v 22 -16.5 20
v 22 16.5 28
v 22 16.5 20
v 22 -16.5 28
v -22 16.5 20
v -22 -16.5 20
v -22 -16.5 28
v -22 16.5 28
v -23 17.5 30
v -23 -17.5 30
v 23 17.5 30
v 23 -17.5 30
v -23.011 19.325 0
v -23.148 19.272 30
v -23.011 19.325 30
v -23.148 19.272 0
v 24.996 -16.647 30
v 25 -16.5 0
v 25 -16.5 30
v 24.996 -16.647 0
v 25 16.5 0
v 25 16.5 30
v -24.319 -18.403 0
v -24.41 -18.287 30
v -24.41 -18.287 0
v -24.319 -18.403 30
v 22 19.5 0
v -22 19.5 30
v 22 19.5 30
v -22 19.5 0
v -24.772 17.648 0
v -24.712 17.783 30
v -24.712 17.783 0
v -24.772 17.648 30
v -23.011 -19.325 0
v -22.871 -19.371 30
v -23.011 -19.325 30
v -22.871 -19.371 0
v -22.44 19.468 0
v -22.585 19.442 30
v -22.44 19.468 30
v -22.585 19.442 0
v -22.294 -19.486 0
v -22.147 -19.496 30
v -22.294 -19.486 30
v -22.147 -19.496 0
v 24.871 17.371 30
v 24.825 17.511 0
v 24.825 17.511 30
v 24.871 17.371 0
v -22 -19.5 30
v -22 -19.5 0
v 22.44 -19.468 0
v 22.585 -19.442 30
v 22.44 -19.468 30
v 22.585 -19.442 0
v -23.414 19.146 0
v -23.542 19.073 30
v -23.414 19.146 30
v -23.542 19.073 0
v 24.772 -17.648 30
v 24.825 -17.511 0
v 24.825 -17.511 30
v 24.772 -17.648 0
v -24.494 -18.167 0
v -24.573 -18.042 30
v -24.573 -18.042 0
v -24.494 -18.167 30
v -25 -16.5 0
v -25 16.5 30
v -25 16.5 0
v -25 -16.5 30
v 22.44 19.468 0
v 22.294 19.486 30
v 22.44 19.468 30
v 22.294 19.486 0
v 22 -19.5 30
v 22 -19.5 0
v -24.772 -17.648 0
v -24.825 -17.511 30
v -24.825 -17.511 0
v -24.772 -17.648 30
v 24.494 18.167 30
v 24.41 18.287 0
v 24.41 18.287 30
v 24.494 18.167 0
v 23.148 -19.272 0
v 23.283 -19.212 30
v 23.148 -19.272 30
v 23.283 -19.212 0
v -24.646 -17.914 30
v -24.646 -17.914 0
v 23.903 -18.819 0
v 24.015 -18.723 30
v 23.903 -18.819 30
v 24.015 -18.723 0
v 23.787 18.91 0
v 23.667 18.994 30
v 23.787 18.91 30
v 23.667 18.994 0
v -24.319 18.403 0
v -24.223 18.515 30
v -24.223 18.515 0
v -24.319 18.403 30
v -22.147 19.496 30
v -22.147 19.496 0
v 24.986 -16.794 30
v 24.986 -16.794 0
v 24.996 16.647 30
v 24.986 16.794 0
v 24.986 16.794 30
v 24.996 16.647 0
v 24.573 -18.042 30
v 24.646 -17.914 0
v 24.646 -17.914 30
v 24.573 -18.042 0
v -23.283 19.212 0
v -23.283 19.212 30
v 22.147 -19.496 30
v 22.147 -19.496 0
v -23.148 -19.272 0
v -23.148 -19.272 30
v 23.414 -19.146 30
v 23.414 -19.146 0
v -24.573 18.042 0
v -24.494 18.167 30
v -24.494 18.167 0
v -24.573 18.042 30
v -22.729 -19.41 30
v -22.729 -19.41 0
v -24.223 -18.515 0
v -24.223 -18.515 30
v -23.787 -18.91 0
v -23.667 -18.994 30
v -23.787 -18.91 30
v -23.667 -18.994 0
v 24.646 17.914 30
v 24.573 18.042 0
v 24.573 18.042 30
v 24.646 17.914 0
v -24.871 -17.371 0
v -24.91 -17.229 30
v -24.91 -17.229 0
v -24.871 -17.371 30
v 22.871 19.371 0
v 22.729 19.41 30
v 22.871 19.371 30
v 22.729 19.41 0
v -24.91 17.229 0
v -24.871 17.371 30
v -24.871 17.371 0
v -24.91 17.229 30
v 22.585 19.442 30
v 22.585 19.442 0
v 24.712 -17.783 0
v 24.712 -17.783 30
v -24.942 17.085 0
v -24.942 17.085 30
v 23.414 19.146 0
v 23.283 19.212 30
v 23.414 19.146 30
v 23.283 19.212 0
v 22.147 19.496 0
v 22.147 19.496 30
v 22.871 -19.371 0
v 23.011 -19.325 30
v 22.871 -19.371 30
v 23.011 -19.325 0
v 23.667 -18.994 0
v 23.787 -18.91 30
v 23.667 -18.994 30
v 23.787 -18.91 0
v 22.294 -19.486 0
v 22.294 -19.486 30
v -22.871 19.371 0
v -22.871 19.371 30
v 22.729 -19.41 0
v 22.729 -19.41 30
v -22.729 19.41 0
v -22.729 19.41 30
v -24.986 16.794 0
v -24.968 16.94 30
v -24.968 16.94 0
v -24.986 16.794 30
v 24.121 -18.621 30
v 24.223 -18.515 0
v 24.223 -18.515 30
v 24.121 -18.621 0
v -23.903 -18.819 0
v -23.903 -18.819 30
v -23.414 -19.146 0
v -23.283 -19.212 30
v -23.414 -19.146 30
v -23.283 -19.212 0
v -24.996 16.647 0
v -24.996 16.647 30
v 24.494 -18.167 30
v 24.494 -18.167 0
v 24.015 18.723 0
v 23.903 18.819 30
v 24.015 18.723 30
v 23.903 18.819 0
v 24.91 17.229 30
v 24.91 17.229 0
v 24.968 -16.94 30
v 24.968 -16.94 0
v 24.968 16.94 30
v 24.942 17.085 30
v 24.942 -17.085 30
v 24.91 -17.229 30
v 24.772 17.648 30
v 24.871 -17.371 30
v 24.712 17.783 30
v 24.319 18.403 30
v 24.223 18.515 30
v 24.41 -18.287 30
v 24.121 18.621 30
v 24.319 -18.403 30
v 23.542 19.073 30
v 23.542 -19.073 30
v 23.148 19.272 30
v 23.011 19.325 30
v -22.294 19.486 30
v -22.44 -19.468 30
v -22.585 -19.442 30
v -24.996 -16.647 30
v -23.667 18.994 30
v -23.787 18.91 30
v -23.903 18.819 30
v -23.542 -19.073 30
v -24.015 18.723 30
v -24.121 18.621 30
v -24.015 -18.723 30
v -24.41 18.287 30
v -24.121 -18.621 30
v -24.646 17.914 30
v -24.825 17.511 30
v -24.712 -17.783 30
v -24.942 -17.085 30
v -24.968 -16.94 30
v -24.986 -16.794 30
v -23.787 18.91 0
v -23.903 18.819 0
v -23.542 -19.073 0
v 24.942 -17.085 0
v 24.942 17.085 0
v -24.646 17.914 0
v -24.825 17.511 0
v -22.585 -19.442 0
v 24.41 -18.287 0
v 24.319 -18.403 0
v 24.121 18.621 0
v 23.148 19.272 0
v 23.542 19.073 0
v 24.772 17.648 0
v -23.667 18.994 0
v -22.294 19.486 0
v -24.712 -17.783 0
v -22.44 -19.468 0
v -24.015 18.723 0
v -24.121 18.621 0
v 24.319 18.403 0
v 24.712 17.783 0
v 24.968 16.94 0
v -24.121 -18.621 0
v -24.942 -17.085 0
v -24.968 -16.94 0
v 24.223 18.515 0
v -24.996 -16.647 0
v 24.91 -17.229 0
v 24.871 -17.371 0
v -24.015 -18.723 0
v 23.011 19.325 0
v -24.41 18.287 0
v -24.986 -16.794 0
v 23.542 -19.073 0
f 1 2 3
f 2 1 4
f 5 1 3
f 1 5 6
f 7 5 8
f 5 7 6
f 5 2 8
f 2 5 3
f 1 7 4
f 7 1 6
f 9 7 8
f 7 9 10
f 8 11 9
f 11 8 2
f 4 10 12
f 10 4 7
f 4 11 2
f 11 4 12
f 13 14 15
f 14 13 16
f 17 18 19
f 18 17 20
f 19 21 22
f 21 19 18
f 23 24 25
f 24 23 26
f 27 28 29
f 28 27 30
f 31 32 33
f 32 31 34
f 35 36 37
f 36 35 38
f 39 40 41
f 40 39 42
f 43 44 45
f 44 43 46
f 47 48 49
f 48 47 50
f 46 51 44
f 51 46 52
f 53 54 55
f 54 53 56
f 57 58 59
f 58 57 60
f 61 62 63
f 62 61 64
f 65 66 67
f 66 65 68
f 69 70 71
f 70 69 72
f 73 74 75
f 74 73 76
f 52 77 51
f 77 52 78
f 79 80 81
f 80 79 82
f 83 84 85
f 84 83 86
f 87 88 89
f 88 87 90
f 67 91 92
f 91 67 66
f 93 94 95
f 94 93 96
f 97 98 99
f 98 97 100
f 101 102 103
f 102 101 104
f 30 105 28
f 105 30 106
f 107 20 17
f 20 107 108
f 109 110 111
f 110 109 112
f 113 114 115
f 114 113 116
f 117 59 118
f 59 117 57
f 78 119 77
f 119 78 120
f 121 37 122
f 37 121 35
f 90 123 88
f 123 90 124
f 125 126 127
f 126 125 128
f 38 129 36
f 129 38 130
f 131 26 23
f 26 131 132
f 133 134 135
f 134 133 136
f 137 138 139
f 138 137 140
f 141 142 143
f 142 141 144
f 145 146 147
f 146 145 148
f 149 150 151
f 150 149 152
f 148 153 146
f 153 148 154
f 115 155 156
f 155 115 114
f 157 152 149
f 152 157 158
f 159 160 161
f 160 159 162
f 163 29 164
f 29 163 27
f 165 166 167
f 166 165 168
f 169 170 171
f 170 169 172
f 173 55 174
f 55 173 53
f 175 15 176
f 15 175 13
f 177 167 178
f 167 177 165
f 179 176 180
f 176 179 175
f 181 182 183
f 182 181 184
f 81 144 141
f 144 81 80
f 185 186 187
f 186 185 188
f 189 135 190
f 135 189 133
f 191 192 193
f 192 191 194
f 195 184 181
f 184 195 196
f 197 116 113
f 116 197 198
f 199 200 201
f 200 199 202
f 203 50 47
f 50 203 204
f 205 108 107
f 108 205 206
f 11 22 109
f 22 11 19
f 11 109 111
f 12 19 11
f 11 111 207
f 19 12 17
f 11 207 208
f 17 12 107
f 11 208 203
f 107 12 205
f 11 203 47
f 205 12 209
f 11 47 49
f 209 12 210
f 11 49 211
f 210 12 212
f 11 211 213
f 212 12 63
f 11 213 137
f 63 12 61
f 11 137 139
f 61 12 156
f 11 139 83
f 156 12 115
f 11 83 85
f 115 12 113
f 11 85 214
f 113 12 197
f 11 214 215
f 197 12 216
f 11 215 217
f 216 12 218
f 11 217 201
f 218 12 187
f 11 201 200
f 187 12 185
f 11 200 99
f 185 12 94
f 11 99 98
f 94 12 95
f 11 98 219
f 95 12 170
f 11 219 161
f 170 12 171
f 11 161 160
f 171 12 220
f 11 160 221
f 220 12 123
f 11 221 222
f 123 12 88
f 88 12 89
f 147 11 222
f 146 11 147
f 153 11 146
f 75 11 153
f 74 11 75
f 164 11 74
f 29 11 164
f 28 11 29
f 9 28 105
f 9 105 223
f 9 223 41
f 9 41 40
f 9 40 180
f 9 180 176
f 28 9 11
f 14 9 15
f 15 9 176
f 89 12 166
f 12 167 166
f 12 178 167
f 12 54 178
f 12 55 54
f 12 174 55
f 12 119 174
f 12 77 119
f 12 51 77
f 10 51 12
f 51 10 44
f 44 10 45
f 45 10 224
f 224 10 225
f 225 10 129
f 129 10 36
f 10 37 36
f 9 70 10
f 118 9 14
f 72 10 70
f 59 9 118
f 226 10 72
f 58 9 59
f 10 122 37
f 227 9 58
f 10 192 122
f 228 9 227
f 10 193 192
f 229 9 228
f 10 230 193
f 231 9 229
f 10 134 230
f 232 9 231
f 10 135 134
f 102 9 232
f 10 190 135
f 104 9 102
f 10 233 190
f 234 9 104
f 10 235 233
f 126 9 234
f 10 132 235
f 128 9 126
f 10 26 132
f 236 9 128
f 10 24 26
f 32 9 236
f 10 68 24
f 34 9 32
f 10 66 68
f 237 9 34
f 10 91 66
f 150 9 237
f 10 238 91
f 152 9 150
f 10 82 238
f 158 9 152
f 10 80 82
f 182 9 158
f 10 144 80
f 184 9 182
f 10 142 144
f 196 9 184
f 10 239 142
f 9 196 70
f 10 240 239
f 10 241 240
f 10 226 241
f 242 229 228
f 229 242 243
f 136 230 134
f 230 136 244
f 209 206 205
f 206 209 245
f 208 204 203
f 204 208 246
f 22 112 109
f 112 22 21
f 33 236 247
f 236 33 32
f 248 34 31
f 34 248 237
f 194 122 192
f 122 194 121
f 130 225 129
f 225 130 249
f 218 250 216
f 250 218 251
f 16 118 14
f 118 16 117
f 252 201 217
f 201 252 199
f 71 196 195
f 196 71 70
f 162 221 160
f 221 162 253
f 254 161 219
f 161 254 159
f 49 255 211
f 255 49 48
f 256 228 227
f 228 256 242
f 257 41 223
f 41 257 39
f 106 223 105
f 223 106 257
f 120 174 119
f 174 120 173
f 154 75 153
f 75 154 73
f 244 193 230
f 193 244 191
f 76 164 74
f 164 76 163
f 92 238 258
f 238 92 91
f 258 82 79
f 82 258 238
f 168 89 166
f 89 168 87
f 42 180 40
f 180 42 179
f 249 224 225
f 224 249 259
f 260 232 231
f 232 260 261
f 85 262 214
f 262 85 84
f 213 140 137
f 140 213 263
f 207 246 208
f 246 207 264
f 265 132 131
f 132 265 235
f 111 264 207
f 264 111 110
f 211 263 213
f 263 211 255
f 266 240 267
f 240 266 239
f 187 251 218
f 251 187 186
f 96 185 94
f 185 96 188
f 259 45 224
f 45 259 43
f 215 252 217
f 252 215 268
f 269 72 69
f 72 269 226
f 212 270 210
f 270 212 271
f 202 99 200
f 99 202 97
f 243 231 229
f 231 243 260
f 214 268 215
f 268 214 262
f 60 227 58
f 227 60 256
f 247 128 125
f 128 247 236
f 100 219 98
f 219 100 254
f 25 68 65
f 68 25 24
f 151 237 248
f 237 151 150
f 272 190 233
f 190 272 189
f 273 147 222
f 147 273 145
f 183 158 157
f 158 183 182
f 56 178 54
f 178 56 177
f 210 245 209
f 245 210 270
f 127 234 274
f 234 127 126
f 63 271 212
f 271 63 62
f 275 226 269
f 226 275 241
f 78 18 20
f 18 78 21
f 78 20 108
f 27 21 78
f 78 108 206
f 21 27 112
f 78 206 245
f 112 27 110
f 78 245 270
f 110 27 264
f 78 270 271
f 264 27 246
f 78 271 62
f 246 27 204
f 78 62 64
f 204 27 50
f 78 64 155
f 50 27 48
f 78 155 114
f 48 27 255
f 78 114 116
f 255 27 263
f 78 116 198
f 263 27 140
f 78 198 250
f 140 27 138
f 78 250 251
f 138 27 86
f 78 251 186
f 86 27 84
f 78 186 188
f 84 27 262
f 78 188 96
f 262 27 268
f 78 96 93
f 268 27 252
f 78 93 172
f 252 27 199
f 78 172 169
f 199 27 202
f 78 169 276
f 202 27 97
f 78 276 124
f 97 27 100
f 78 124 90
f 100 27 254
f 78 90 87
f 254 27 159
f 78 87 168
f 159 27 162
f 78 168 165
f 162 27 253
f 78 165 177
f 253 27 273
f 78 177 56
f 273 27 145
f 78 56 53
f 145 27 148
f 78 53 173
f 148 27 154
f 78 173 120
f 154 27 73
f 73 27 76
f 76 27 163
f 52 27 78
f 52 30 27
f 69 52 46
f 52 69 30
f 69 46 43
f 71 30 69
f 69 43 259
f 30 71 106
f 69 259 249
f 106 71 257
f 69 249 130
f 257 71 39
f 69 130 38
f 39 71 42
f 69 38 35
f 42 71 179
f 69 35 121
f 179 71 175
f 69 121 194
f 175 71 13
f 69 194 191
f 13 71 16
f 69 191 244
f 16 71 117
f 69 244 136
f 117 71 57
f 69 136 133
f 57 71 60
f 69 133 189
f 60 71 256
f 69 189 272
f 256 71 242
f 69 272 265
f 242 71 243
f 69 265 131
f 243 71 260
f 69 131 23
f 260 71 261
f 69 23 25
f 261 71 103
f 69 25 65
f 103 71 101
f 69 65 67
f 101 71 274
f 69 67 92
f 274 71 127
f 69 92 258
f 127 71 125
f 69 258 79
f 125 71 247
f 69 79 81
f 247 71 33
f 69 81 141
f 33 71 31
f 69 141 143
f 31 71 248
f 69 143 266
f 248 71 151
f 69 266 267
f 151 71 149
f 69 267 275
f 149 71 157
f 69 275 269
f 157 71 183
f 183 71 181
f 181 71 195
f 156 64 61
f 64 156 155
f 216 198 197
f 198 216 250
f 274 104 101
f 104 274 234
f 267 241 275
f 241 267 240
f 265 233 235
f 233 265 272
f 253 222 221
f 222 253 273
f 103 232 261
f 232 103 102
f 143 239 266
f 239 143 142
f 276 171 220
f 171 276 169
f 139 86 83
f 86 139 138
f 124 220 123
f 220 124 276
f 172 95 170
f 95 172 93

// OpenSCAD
//###############################################################################
//# Ivar Feet                                                                   #
//###############################################################################
//#    Copyright 2024 Dirk Heisswolf                                            #
//#    This file is part of the IvarFeet project.                               #
//#                                                                             #
//#    This project is free software: you can redistribute it and/or modify     #
//#    it under the terms of the GNU General Public License as published by     #
//#    the Free Software Foundation, either version 3 of the License, or        #
//#    (at your option) any later version.                                      #
//#                                                                             #
//#    This project is distributed in the hope that it will be useful,          #
//#    but WITHOUT ANY WARRANTY; without even the implied warranty of           #
//#    MERCHANTABILITY or FITNESS FOR A PARTICULAR PURPOSE.  See the            #
//#    GNU General Public License for more details.                             #
//#                                                                             #
//#    You should have received a copy of the GNU General Public License        #
//#    along with this project.  If not, see <http://www.gnu.org/licenses/>.    #
//#                                                                             #
//###############################################################################
//# Description:                                                                #
//#   Feet for Ivar shelf                                                       #
//#                                                                             #
//###############################################################################
//# Version History:                                                            #
//#   February 17, 2025                                                         #
//#      - Initial release                                                      #
//#                                                                             #
//###############################################################################

legW  = 44; //width of the leg
legD  = 33; //depth of the leg
legH  = 10; //height of the overlap
footH = 10; //distance to the ground
footT = 3; //thickness of the foot
$fn   = 128;

module ivarFoot(h=footH) {
  difference() {
    union() {
        hull() {
            translate([ legW/2, legD/2,0]) cylinder(h=legH+h, r=footT);
            translate([ legW/2,-legD/2,0]) cylinder(h=legH+h, r=footT);
            translate([-legW/2, legD/2,0]) cylinder(h=legH+h, r=footT);
            translate([-legW/2,-legD/2,0]) cylinder(h=legH+h, r=footT);
        }
    }
    union() {
        translate([0,0,20+h]) cube([legW,legD,40], center=true);
        hull() {
            translate([0,0,23+h]) cube([legW,legD,30], center=true);
            translate([0,0,24+h]) cube([legW+2,legD+2,28], center=true);
        }
        
    }
  }
}
*ivarFoot();
*ivarFoot(15);
ivarFoot(20);
